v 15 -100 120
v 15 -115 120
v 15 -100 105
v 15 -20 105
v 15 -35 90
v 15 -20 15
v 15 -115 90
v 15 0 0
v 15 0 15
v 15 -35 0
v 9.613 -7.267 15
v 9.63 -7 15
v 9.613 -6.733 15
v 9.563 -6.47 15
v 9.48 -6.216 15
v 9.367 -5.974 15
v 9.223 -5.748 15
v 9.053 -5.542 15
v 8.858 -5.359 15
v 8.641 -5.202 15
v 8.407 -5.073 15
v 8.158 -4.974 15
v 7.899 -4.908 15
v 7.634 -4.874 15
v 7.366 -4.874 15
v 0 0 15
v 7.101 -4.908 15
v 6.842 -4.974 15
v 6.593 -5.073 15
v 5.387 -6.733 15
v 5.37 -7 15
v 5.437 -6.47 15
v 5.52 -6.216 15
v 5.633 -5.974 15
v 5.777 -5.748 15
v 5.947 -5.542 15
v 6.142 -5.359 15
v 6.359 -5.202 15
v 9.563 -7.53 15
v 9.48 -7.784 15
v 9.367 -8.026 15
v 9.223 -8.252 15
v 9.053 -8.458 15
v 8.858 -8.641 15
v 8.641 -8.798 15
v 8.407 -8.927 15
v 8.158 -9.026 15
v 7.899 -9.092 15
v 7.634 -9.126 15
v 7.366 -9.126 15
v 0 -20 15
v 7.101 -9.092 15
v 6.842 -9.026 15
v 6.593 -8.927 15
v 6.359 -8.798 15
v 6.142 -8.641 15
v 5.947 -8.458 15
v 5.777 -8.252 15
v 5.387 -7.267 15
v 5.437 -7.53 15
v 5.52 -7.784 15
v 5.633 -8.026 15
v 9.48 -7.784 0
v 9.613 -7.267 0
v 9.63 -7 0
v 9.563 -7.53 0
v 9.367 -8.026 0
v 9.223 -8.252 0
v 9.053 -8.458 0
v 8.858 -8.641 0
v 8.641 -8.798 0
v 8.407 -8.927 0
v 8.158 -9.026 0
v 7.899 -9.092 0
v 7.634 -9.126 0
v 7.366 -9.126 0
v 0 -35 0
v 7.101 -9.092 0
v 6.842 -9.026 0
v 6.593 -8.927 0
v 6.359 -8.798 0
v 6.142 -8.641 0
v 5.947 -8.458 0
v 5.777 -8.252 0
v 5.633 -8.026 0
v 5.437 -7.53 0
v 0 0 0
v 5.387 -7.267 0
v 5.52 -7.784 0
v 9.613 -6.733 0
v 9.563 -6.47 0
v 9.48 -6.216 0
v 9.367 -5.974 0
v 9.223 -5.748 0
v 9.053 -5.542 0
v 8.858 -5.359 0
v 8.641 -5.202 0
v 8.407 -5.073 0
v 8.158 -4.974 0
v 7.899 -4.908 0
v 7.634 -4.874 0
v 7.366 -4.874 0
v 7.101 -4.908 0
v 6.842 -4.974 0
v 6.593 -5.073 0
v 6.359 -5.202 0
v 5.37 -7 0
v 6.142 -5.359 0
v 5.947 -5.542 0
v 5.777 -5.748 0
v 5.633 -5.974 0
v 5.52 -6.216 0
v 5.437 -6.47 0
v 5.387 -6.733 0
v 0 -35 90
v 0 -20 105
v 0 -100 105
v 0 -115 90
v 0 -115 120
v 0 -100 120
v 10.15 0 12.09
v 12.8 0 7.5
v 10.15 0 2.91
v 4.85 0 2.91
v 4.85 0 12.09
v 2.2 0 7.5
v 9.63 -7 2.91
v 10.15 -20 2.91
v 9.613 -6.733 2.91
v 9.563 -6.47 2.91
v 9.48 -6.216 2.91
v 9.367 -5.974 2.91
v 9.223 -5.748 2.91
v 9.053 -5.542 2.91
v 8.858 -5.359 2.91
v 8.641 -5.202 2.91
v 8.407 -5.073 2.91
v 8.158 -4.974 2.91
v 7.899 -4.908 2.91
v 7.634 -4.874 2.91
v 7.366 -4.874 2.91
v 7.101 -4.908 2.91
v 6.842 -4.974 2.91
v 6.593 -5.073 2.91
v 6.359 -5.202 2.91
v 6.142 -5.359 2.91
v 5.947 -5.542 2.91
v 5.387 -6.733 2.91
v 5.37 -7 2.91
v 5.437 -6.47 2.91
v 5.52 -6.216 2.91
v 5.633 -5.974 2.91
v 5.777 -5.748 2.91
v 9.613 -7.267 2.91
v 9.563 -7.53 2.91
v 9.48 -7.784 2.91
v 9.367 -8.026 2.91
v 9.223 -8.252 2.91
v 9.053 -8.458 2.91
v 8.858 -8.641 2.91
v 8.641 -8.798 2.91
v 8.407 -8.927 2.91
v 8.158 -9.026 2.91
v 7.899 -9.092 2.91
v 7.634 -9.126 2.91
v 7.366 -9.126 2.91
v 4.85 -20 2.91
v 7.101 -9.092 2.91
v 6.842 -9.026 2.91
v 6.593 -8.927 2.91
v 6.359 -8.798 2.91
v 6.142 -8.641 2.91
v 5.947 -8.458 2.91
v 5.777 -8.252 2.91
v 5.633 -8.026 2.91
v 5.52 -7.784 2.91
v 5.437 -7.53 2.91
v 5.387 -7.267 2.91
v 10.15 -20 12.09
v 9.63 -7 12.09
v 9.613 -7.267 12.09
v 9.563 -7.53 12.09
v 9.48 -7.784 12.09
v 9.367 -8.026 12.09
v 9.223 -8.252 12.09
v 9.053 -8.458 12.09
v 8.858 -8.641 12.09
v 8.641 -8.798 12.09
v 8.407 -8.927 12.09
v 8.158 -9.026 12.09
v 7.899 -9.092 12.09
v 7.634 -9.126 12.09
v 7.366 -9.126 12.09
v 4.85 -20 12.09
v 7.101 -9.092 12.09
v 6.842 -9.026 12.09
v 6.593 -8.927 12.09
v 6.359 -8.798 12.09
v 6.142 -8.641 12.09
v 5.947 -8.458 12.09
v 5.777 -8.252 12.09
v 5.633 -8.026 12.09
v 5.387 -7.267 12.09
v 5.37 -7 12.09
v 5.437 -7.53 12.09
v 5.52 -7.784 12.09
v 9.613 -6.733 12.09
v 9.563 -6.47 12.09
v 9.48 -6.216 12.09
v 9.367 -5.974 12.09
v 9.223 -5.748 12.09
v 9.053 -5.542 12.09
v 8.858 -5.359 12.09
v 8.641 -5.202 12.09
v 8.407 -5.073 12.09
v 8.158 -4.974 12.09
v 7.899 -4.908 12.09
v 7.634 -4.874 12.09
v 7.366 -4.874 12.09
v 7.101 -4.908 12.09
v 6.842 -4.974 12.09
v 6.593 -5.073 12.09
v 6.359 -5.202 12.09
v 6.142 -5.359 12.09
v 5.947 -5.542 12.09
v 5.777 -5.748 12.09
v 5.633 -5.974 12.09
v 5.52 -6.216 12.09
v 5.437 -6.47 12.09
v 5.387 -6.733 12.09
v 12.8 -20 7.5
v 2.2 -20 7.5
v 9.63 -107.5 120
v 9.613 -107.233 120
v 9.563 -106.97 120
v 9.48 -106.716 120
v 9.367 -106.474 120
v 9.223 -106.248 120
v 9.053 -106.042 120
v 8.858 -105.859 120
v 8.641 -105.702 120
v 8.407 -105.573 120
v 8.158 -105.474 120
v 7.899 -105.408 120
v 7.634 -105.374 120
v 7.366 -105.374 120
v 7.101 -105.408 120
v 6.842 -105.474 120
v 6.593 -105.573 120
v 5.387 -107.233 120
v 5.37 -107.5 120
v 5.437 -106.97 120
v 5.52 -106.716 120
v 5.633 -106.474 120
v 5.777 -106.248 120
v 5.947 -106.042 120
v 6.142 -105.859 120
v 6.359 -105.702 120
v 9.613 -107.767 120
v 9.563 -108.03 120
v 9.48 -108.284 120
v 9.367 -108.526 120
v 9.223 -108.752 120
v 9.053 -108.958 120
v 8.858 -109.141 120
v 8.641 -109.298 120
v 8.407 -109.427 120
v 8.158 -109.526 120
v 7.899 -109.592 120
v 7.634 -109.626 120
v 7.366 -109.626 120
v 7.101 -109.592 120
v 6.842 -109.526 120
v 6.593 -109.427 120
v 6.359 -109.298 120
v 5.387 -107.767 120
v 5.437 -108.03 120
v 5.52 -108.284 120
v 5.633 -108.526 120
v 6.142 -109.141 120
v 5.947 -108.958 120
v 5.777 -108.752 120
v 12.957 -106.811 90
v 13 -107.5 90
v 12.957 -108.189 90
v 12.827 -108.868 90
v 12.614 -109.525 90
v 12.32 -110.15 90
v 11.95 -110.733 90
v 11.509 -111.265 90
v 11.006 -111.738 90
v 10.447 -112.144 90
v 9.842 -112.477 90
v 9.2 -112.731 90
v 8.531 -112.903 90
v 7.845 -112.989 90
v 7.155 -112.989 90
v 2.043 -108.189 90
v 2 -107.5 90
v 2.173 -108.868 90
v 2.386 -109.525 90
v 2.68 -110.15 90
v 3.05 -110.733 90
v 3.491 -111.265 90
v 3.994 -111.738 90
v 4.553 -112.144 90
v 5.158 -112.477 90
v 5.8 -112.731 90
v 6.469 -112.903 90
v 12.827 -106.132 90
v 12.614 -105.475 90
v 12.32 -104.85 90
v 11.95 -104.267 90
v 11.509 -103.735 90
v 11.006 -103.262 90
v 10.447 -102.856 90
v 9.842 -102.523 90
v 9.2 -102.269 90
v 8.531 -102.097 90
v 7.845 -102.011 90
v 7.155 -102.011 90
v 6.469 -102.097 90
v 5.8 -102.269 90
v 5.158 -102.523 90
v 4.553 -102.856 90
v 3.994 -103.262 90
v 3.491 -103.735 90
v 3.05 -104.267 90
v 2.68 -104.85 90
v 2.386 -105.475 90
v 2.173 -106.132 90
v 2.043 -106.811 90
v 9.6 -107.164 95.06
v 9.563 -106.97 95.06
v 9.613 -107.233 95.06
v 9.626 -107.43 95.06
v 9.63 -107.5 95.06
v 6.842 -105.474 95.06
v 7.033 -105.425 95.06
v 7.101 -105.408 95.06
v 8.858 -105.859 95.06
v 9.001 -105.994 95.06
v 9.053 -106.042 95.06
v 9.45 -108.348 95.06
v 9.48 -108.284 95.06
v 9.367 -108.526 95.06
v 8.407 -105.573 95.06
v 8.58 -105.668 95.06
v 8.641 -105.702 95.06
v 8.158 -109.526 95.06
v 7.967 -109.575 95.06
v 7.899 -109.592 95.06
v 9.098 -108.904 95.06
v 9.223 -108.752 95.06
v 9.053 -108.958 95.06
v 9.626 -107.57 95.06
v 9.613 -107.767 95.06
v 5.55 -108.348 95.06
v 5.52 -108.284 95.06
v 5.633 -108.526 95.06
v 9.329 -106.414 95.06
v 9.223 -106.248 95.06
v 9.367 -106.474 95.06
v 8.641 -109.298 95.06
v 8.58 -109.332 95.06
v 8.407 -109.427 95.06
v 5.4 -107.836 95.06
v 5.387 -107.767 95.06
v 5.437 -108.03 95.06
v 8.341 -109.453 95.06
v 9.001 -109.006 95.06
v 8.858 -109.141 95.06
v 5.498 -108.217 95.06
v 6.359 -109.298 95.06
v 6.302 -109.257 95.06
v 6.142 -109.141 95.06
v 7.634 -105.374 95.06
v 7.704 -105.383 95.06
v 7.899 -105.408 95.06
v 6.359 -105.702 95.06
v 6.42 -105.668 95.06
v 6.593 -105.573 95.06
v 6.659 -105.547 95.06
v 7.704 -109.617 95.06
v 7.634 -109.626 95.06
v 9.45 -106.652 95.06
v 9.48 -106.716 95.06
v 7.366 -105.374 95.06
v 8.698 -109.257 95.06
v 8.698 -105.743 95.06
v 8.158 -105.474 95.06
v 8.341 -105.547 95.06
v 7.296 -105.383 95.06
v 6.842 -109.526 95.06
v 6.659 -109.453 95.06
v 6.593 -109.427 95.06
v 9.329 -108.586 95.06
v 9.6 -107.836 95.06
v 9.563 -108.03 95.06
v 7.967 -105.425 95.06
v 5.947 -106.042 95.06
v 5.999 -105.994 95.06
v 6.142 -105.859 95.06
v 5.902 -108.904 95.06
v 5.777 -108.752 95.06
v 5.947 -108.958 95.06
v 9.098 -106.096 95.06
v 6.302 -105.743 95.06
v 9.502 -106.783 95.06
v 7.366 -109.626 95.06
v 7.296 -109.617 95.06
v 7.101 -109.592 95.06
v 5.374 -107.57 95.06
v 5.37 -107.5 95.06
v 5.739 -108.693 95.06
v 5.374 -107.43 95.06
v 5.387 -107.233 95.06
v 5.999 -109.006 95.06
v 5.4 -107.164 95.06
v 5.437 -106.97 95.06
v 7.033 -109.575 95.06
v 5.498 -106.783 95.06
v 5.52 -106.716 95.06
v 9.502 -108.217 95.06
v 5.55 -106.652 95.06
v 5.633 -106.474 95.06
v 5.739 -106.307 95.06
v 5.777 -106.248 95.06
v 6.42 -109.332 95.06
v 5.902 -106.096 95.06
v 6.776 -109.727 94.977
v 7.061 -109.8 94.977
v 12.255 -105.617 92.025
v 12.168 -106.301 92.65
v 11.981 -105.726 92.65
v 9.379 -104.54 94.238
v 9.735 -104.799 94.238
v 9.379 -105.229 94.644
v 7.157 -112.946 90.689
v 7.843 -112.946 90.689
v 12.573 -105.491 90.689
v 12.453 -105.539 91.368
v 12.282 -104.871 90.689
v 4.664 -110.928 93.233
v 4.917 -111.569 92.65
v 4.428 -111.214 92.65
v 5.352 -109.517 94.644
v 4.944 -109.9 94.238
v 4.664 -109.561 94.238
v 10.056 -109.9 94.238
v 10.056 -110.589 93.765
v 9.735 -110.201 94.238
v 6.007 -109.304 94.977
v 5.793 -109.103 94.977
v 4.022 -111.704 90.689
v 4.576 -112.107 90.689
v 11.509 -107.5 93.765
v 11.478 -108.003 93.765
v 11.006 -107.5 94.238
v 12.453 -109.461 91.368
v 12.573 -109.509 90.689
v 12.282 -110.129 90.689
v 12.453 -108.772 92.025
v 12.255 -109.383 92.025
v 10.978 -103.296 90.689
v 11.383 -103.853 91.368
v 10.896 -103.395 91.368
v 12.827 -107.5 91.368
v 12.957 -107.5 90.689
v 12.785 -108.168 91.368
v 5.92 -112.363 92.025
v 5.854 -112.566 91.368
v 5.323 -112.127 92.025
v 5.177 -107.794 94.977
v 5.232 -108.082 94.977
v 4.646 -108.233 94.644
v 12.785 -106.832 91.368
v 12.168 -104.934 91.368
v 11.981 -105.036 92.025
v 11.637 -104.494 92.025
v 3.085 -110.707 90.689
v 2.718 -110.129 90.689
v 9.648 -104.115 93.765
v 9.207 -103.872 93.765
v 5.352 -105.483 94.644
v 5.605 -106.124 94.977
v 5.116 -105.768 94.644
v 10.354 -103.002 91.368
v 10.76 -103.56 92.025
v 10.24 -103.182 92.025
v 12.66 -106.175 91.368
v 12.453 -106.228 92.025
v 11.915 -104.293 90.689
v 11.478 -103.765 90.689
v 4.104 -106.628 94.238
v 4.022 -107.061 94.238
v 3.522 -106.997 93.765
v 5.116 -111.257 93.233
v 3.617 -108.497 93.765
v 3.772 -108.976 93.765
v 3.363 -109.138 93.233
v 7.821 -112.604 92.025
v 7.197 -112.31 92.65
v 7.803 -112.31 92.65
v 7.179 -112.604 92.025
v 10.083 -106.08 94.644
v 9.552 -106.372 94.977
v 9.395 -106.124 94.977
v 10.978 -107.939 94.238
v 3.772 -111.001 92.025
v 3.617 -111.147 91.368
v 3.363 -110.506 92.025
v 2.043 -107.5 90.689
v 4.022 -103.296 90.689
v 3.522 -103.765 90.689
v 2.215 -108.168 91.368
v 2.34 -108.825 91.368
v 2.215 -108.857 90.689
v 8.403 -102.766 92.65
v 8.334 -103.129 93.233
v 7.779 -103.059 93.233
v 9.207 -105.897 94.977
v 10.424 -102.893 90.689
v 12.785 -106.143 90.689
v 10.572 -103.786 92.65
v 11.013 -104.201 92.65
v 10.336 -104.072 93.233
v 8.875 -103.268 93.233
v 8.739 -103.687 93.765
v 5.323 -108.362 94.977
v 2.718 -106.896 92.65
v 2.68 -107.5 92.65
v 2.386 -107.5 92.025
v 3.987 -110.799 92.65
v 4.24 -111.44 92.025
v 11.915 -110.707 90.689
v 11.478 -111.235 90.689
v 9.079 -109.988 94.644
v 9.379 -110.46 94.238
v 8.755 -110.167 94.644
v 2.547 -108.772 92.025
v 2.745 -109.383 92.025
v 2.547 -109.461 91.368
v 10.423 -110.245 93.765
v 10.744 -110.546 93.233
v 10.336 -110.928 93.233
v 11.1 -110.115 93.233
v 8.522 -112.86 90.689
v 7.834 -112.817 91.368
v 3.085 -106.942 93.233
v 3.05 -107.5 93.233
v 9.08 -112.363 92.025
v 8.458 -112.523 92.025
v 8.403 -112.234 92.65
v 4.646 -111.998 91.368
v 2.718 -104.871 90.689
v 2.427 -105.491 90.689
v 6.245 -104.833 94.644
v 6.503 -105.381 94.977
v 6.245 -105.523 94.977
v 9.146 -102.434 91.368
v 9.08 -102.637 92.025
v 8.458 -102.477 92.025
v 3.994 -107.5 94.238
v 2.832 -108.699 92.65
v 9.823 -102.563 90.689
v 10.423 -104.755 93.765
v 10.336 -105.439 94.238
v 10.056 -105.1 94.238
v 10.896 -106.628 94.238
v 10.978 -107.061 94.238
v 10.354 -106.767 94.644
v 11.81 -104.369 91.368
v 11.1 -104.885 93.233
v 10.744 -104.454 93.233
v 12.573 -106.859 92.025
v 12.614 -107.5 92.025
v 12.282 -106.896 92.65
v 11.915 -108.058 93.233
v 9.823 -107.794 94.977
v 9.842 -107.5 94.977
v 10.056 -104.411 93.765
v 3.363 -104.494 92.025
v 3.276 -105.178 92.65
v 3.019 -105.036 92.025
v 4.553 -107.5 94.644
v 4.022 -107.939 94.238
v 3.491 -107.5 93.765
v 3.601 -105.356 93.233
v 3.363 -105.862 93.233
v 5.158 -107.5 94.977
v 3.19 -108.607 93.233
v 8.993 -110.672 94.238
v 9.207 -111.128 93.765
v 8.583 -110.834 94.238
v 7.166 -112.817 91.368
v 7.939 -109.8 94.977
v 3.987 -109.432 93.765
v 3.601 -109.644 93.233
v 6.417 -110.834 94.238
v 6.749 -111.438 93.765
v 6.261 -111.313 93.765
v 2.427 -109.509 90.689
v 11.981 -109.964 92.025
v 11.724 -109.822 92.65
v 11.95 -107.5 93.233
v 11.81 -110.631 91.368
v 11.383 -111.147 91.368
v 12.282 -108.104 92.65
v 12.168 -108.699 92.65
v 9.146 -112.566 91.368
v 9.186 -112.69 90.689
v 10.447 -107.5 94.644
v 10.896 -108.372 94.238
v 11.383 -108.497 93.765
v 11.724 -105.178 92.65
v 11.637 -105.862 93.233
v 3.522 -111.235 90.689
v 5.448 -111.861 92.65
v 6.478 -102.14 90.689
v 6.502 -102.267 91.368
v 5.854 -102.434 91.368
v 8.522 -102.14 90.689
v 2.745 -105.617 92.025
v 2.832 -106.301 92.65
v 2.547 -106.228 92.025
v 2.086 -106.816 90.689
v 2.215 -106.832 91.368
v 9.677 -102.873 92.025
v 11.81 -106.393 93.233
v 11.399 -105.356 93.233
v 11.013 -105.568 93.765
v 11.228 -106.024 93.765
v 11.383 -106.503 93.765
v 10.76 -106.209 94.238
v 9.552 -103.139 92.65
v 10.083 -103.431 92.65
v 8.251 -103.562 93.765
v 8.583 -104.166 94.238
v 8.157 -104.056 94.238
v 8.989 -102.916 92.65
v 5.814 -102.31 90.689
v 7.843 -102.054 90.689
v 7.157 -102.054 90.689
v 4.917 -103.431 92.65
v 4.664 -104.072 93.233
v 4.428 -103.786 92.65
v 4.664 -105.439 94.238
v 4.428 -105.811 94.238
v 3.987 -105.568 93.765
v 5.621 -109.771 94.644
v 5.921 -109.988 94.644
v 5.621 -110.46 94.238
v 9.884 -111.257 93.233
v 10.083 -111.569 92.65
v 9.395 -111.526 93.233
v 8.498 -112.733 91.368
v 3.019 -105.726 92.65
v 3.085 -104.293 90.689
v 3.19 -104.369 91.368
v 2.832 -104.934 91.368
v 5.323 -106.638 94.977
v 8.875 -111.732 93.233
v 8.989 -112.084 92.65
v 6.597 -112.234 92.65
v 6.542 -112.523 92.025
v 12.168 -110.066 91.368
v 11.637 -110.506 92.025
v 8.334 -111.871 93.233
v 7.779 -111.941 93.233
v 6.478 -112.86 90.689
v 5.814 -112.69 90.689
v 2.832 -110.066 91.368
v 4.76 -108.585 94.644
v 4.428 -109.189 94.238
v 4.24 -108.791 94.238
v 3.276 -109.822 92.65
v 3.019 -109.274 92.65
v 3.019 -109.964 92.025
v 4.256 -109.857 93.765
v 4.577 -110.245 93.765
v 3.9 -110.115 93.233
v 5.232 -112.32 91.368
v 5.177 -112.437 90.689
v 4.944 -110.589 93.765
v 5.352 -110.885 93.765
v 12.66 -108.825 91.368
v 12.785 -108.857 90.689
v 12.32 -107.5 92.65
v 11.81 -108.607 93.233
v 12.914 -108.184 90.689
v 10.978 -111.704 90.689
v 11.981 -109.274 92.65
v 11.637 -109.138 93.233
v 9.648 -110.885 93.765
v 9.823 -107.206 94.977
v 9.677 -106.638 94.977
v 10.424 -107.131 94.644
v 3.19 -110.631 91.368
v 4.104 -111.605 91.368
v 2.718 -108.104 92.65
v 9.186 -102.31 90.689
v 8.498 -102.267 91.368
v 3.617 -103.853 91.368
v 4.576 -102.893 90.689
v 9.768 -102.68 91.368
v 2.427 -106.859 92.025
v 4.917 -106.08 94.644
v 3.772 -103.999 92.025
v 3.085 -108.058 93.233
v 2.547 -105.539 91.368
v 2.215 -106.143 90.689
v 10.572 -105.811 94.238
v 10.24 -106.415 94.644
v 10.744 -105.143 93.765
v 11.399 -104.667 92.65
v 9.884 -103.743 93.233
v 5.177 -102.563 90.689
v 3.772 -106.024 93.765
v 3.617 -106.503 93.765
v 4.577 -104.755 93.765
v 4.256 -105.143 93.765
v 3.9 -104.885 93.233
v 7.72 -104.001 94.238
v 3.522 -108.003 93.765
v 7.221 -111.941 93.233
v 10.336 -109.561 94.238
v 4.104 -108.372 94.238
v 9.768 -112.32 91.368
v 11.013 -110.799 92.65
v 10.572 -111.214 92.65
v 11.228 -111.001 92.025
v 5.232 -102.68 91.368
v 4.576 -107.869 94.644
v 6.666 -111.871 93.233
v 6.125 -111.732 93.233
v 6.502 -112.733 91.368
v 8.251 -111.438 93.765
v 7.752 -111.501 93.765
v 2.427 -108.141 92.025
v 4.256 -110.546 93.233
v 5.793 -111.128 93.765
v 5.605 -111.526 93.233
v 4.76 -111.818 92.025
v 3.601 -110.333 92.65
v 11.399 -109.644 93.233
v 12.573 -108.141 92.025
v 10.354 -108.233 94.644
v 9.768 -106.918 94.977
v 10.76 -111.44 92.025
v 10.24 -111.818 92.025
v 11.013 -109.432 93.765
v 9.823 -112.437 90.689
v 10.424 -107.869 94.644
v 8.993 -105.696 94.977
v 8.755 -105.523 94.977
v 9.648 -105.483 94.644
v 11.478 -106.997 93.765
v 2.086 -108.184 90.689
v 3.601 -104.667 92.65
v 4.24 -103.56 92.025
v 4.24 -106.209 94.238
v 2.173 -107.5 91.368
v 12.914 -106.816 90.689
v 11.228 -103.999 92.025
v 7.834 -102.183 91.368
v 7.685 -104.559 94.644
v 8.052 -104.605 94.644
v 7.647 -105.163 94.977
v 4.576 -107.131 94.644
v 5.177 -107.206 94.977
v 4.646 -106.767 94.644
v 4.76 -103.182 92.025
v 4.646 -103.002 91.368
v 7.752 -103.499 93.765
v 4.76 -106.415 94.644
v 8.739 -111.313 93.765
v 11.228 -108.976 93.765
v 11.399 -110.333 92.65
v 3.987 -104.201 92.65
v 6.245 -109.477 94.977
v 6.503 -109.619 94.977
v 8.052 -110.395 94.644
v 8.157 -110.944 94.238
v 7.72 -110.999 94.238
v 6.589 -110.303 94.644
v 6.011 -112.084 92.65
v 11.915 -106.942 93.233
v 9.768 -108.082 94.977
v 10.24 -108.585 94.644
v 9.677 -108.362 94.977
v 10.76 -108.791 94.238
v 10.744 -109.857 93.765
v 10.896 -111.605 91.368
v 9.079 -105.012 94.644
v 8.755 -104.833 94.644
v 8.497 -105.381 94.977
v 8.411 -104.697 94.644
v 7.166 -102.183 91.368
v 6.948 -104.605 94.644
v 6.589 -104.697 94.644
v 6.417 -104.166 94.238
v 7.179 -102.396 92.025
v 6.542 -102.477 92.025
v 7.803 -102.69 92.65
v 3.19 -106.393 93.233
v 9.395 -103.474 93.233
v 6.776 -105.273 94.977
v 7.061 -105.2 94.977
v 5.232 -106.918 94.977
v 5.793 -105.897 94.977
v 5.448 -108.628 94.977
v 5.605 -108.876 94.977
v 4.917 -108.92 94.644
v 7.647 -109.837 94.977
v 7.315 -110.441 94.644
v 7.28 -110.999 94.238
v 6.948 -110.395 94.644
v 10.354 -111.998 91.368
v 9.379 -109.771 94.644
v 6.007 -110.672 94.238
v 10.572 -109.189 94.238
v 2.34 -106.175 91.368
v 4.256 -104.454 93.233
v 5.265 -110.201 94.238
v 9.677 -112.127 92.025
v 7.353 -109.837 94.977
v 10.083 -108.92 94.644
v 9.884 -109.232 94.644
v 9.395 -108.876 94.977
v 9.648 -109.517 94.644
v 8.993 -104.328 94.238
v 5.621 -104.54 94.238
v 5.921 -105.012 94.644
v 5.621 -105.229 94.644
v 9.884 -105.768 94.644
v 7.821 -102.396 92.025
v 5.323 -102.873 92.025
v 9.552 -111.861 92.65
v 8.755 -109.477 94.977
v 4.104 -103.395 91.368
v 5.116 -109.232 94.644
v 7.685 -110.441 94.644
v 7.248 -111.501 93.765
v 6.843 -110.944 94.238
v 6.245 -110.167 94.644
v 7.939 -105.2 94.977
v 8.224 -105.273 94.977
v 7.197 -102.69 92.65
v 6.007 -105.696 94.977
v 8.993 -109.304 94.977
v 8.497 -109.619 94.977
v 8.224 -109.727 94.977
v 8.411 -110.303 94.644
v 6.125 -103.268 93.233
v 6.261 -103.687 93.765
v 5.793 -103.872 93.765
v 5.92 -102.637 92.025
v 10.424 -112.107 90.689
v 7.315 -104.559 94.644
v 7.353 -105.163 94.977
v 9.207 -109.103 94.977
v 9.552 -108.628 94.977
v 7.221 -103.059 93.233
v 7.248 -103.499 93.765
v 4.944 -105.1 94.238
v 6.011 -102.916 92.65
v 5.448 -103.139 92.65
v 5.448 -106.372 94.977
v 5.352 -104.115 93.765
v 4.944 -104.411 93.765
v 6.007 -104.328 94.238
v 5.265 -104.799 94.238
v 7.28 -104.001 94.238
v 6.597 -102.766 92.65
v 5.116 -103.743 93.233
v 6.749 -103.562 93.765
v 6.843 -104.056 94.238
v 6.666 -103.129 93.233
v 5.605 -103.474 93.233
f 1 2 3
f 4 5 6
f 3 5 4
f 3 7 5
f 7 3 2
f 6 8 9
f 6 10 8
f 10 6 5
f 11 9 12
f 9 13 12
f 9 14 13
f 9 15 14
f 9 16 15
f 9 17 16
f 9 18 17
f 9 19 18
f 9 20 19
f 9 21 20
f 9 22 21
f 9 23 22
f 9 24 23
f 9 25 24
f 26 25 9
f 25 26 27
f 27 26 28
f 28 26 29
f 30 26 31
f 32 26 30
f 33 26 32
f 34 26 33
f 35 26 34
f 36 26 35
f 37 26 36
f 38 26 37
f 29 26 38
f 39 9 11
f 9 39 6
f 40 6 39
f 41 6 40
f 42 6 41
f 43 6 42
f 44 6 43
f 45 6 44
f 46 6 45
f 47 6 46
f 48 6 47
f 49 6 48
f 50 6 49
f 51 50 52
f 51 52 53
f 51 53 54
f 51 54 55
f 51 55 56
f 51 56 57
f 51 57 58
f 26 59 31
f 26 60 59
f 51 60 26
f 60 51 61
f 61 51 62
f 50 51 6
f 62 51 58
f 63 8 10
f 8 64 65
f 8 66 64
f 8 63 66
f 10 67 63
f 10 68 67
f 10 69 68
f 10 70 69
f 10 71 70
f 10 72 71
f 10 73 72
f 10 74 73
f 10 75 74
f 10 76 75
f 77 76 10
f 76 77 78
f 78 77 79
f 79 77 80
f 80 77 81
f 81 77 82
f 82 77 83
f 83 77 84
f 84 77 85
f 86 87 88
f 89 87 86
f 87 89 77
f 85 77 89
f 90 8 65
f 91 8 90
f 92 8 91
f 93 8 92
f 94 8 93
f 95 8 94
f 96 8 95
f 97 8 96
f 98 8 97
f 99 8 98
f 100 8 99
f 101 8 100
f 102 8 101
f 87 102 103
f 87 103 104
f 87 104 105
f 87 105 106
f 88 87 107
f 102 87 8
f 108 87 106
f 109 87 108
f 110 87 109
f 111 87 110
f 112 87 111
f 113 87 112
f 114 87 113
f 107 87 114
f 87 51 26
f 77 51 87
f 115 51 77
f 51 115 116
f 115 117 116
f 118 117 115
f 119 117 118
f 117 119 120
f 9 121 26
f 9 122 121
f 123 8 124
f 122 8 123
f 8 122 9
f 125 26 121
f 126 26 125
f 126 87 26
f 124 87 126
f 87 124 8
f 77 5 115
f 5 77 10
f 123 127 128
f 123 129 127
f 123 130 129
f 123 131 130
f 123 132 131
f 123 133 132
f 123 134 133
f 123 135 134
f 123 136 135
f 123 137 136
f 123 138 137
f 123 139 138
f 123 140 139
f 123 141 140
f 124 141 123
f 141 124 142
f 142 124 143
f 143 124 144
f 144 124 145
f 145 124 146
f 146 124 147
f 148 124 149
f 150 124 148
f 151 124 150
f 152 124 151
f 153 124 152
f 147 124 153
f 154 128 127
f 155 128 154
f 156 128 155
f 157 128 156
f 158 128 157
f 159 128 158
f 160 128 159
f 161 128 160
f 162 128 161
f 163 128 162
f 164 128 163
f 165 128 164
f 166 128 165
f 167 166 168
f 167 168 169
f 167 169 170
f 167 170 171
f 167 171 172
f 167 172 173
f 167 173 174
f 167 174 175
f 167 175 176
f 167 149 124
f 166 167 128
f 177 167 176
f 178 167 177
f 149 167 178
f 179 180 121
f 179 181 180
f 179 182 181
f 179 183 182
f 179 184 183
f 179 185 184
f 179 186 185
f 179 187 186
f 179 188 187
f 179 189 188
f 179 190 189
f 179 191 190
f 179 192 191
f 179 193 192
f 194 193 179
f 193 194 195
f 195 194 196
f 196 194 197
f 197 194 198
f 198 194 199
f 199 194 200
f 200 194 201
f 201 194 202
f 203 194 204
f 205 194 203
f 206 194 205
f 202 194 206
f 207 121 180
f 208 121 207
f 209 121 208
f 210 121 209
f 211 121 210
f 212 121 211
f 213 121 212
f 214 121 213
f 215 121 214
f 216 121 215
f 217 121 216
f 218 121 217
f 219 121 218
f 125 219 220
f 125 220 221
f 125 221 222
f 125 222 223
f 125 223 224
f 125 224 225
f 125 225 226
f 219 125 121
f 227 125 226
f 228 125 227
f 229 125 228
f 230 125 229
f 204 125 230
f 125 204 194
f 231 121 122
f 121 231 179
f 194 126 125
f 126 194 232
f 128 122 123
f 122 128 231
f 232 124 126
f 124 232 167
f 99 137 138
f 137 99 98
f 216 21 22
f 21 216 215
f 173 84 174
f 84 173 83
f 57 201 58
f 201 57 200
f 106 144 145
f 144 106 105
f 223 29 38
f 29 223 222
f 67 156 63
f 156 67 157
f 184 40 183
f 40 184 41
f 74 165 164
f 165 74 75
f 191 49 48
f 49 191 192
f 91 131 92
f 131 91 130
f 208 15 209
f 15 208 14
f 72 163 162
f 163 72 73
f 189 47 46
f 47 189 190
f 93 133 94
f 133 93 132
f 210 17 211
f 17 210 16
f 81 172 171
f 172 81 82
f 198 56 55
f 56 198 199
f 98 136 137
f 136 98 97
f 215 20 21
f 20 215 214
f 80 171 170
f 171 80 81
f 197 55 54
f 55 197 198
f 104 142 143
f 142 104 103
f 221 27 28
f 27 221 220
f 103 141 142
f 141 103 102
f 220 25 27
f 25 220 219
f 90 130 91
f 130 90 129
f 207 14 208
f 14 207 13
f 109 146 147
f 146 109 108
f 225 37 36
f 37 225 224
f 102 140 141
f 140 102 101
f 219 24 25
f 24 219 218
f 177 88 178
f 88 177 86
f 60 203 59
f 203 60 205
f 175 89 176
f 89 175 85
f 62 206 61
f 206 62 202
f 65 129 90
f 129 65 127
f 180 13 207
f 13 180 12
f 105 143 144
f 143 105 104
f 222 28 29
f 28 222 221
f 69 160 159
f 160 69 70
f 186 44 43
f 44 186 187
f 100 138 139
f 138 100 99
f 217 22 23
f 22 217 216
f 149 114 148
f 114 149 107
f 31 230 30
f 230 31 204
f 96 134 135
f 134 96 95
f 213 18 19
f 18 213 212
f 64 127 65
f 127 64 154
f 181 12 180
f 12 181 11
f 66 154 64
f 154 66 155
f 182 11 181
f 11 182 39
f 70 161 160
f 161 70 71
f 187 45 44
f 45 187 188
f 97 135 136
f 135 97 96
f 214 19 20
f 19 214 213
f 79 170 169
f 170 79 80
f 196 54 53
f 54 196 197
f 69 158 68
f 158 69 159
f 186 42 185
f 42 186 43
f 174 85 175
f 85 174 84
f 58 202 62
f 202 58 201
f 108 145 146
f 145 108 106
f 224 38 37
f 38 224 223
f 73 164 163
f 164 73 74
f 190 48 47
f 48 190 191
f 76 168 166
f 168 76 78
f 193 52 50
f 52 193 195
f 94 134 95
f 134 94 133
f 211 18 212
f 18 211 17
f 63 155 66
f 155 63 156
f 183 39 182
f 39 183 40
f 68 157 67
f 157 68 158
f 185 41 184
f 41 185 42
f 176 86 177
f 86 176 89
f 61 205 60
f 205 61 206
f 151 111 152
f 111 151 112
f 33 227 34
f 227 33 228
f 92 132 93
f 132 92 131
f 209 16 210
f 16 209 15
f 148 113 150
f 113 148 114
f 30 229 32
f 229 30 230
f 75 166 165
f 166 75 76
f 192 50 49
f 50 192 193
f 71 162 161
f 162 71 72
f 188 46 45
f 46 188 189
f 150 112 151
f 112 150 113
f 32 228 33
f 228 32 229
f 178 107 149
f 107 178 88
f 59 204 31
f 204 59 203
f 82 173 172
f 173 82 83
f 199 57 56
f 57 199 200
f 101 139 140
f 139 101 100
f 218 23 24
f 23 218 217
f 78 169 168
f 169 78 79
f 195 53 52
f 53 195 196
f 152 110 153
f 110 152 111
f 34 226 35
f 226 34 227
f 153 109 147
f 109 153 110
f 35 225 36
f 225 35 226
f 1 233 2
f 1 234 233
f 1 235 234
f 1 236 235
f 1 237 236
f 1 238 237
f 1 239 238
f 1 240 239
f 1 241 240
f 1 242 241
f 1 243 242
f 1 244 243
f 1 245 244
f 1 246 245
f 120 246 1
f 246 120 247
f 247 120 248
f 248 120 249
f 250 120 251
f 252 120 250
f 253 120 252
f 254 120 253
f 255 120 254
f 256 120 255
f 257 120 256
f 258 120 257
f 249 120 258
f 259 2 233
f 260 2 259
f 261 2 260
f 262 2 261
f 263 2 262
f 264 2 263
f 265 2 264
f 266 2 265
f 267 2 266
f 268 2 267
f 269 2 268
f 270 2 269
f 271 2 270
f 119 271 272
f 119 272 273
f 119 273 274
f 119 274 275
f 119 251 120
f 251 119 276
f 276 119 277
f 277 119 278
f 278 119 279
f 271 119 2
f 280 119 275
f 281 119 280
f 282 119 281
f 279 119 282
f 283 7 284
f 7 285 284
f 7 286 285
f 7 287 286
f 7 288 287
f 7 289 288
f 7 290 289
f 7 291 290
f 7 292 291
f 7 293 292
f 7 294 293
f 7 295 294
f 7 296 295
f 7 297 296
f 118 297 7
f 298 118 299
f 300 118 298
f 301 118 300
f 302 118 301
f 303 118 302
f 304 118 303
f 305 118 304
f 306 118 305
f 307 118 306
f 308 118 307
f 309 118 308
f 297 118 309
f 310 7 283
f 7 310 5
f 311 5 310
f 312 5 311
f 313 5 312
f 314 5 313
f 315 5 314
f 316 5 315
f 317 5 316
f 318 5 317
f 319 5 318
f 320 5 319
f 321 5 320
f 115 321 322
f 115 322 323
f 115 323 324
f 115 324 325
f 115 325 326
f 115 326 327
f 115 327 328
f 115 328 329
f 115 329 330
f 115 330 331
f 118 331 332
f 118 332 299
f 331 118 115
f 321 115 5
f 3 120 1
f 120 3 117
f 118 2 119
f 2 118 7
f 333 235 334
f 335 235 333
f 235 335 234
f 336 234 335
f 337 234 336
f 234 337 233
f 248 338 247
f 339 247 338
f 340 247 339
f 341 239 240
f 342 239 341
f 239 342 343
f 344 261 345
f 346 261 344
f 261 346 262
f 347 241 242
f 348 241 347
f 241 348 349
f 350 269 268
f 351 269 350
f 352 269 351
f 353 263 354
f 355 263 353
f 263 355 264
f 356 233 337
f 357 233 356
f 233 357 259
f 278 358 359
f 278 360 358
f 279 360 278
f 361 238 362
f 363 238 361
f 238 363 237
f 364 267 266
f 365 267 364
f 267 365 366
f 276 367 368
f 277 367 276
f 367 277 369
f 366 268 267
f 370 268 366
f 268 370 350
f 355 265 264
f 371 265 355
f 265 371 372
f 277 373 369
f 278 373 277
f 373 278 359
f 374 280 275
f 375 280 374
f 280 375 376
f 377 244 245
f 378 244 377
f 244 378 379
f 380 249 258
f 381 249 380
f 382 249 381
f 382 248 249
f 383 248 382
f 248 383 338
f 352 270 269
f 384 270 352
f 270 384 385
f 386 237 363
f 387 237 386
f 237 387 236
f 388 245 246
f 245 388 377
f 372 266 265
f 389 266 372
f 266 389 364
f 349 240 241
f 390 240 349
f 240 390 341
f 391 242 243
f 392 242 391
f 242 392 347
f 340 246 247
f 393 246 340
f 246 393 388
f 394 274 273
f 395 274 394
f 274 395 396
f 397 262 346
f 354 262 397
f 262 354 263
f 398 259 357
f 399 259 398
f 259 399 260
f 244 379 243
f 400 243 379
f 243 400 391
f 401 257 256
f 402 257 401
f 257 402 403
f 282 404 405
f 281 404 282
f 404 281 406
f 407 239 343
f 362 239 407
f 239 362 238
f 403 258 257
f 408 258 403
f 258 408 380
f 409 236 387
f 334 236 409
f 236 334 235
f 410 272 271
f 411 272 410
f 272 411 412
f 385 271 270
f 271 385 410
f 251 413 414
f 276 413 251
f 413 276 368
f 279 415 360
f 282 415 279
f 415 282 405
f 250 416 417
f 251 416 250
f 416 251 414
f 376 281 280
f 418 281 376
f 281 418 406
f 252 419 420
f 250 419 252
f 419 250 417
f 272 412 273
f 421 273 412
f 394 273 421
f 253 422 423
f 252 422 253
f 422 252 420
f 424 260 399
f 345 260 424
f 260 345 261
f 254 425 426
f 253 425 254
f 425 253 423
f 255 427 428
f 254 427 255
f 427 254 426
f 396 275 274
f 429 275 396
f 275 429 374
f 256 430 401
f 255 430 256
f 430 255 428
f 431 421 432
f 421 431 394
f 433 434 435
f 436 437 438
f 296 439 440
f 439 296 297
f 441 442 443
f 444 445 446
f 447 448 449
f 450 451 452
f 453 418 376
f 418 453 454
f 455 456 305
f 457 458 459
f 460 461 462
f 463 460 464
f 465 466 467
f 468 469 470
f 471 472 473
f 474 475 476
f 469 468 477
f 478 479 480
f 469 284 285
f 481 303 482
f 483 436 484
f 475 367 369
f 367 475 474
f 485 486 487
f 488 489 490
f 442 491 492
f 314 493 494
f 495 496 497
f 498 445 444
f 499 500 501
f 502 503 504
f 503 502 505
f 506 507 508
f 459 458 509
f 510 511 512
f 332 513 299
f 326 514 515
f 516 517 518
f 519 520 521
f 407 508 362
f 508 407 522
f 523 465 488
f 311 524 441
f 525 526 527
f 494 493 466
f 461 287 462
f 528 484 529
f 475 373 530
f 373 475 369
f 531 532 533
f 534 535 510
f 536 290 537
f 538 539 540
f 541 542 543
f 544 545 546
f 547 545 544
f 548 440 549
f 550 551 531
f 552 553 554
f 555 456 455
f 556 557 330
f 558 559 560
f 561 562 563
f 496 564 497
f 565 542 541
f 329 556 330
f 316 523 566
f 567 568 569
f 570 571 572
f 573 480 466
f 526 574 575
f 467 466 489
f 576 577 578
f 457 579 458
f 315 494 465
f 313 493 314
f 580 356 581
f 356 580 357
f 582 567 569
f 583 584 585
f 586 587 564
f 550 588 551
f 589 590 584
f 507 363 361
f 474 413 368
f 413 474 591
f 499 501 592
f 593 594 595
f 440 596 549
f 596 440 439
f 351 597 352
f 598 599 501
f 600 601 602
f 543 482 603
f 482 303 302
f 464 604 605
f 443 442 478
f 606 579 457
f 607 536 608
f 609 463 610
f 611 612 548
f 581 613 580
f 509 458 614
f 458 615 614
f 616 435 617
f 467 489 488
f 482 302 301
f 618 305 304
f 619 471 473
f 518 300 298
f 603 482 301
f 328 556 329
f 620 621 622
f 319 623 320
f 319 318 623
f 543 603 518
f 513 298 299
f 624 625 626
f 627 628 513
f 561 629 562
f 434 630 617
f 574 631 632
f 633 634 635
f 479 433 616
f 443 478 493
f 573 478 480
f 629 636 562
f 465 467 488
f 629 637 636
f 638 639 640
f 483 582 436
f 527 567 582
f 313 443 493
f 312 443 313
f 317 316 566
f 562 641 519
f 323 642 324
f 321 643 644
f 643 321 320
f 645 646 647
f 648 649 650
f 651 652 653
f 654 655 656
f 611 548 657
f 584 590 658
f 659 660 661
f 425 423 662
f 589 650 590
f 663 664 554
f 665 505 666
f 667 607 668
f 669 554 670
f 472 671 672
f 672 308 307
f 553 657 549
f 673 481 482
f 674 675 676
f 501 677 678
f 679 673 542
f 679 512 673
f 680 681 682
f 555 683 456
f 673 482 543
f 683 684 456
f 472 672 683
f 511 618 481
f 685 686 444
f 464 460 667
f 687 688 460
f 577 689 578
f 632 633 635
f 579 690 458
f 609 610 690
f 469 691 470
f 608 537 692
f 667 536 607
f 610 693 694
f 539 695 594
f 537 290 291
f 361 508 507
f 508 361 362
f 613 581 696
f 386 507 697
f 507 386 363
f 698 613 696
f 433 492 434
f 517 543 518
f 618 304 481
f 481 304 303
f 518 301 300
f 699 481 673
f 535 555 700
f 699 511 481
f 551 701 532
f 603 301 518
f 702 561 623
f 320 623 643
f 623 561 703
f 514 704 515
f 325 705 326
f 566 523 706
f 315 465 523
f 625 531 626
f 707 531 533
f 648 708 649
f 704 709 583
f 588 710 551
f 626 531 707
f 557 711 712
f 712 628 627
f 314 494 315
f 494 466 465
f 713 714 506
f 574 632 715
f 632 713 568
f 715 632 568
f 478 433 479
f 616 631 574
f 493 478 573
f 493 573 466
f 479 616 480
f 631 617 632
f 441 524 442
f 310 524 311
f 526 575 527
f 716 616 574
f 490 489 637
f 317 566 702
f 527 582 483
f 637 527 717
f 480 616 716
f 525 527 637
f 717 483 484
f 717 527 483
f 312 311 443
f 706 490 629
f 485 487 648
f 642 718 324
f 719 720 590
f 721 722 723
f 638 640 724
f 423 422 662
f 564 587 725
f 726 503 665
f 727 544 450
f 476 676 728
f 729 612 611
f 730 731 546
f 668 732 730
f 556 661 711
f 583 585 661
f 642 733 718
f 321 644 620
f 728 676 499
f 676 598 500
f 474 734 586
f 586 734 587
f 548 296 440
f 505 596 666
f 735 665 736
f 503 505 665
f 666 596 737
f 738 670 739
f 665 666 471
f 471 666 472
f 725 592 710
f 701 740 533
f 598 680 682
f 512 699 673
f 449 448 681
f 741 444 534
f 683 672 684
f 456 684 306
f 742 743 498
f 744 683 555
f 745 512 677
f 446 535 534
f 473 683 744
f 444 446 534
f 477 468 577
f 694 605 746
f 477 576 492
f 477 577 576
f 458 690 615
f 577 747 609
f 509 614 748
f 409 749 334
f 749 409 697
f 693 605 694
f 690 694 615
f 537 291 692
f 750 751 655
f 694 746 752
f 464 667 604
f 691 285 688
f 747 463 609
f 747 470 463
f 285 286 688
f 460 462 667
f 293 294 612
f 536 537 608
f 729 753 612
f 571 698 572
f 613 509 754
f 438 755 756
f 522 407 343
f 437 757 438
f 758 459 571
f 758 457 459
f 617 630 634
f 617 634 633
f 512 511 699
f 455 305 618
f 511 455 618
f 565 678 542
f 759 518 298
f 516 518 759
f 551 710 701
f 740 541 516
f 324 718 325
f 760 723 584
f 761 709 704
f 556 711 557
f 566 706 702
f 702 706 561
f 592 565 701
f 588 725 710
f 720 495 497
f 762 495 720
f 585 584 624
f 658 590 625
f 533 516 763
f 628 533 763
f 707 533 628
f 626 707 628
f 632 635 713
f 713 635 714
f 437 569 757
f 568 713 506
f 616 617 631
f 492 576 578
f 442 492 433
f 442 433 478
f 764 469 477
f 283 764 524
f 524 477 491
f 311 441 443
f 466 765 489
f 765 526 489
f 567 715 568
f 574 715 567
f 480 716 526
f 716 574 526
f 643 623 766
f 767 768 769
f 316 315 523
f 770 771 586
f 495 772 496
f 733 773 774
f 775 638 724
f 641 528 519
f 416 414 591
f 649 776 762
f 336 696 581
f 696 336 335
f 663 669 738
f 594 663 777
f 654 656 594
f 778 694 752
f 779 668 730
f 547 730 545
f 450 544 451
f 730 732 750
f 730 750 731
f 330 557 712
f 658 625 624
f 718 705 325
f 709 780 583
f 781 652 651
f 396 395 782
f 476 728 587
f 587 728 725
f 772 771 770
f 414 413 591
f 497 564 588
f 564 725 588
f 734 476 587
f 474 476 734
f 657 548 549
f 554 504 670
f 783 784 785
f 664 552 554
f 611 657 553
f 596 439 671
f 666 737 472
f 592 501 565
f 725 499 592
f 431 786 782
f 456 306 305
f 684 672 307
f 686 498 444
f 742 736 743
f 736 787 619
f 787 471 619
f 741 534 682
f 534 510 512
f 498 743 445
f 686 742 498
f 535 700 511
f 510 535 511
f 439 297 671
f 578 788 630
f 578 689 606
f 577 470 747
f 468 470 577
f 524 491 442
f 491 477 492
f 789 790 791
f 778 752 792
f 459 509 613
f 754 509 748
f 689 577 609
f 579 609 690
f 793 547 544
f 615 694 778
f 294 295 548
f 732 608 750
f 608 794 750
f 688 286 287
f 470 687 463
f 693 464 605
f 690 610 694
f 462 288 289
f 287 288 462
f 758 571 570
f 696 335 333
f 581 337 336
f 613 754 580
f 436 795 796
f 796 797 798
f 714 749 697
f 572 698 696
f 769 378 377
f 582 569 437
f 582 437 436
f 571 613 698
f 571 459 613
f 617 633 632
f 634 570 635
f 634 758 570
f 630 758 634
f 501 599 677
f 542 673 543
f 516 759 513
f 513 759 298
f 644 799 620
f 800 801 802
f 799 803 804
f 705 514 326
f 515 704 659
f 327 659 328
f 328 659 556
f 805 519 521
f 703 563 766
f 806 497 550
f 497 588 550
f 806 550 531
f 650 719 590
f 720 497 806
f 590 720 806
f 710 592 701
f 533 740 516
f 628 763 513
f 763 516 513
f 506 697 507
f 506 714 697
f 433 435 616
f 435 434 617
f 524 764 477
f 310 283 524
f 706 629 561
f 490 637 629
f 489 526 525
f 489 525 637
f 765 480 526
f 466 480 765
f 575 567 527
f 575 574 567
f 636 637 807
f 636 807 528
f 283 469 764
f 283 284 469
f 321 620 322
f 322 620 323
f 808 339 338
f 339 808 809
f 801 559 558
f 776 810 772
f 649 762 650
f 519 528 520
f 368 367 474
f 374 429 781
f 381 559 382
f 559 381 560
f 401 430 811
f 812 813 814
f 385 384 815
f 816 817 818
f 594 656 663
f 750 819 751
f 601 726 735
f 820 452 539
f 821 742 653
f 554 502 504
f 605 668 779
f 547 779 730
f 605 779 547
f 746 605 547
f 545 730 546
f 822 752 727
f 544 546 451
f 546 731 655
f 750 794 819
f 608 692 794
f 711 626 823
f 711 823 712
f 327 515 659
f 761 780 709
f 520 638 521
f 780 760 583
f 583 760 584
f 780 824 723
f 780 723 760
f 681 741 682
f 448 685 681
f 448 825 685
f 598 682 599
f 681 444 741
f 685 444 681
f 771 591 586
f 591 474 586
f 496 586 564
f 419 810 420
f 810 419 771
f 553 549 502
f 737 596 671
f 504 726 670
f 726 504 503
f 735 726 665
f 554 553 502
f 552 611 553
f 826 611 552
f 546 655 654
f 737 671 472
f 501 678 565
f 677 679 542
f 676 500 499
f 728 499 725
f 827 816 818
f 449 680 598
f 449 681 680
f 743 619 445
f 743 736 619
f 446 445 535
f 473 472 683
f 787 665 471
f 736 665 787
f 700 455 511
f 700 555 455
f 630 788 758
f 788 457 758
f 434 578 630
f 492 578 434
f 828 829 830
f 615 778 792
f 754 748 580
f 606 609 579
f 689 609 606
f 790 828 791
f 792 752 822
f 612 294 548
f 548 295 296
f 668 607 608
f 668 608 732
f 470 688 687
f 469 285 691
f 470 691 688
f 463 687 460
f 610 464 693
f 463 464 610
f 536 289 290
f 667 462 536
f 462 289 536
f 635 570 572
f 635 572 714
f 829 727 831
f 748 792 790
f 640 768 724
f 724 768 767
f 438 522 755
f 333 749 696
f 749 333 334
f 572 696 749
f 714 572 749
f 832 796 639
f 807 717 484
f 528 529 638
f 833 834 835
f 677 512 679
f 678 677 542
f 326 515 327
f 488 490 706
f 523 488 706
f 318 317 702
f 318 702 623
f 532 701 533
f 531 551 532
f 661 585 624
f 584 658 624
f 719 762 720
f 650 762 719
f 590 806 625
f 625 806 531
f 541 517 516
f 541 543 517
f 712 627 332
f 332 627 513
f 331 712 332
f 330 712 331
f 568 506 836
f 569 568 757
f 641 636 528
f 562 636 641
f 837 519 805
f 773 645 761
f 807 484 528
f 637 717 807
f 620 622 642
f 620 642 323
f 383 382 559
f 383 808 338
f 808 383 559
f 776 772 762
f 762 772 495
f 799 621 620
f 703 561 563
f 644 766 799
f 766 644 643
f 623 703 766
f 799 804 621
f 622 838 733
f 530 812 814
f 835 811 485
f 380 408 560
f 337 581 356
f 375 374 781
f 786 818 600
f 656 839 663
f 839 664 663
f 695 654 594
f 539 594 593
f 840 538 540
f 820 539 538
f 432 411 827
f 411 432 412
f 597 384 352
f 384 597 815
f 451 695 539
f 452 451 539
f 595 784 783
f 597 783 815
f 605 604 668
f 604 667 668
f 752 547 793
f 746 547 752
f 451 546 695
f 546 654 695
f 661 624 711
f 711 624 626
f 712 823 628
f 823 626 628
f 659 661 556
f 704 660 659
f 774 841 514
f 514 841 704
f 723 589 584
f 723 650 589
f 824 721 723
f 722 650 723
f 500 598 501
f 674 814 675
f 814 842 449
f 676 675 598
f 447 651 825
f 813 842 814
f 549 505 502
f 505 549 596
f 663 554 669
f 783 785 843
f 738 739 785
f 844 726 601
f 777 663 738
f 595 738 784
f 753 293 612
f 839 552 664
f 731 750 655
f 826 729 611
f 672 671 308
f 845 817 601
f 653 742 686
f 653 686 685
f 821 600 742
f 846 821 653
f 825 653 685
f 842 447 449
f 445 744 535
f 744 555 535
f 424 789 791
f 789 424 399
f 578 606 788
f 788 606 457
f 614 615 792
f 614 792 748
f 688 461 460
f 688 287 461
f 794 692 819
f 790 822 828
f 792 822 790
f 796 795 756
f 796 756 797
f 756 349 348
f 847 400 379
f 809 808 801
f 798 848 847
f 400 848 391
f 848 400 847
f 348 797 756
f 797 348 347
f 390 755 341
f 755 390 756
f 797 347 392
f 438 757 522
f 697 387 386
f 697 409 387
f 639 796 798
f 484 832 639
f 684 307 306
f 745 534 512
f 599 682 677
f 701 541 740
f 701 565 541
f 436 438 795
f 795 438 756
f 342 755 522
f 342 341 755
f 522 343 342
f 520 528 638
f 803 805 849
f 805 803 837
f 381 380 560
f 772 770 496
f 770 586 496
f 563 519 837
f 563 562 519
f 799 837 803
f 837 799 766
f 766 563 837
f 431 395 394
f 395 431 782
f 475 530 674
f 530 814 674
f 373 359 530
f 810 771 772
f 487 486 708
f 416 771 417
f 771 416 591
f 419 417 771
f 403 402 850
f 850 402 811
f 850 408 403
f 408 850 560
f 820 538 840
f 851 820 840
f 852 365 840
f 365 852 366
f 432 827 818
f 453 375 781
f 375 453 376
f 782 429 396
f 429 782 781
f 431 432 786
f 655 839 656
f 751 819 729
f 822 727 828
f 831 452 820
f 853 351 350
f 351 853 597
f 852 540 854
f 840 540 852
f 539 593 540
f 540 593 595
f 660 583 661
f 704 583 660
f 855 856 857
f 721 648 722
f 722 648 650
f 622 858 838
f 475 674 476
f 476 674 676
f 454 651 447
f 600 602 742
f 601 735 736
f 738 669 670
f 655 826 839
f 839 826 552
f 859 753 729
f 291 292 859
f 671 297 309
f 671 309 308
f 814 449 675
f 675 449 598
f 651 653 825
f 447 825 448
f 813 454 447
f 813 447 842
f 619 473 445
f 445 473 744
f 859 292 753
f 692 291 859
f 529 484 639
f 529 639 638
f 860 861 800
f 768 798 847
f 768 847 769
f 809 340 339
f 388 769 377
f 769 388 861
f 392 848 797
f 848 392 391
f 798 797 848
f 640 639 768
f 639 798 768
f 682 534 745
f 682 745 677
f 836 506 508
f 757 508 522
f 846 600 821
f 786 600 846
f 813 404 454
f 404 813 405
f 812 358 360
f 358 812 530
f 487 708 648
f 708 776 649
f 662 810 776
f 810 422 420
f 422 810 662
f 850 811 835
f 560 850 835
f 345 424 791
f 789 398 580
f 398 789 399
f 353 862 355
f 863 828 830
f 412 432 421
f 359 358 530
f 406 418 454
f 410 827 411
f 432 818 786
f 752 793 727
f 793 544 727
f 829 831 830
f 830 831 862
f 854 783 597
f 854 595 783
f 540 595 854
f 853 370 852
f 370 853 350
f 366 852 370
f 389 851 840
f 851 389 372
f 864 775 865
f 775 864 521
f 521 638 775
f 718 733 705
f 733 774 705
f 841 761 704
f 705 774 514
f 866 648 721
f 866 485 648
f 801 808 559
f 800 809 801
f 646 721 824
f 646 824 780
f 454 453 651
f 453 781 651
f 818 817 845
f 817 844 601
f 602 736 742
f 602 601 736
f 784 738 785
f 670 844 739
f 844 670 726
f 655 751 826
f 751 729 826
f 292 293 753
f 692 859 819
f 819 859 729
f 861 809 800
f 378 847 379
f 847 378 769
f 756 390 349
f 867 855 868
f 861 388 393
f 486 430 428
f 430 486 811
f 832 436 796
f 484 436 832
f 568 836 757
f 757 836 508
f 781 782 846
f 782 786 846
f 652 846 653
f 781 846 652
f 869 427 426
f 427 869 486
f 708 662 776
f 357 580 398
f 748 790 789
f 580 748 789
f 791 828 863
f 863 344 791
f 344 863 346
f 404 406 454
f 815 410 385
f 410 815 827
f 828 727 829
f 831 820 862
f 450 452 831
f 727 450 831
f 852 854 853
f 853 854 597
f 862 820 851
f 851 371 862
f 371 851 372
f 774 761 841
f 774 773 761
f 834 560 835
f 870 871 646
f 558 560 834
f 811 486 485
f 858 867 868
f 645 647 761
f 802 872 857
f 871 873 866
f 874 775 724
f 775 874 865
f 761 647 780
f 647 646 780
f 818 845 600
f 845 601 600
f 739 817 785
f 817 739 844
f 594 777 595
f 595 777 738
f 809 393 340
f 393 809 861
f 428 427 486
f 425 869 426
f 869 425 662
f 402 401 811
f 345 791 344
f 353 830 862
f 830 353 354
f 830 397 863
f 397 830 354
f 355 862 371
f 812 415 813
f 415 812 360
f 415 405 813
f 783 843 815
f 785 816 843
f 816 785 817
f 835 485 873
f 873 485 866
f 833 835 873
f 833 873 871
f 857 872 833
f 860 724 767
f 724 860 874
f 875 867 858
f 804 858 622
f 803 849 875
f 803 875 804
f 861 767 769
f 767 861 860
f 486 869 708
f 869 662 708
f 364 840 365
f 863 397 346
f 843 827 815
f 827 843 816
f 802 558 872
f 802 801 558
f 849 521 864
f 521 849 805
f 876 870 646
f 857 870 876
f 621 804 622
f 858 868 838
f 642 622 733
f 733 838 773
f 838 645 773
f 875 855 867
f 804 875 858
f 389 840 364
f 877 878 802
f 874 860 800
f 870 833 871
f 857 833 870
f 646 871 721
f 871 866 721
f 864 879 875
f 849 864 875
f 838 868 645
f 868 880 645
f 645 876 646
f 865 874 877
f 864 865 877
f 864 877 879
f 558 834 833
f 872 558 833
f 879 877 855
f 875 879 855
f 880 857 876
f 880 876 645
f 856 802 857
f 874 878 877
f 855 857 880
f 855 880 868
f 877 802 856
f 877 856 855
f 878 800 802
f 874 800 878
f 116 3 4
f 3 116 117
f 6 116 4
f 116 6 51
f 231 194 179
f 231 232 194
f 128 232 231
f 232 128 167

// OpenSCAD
// file: HS_moth_tether_0_variables.scad
// v2
$fn = 50;

//Old design
wd=15;
L1=20+wd;
L2=75+(2*wd);
L3=65+wd;
L4=30;

//From motor
len_shaft=16; 
r_shaft=3.23;
r_bolt=2.13; //M4 : 4.3mm

//New ball-socket sizes (2mm saperation from edge)
r_ball_socket=5.5;
r_ball=4.85;

r_tether=3.2;
r_tether_hole=2.5;
r_tether_bolt=1.65; //M3 : 3.3mm
r_tether_bolt_case=3.5;
h_tether=63;
h_tether_bolt=15;
h_tether_bolt_case=h_tether_bolt;
// main file
include <HS_moth_tether_0_variables.scad>

//----------------------------//
//L1:with shaft and bolt-socket
difference(){
 translate([0,-L1,0]){
 cube([wd,L1,wd]);}
////Shaft_hex
 translate([(wd/2),-11.5,(wd/2)]){rotate(a=90,v=[1,0,0]){
   Polygon(N=6,R=5.3,h=23.1);}}
////Bolt at shaft
 translate([(wd/2),-7,-1]){
 cylinder(r=r_bolt,h=wd+2);} //5 , 10
}


// Right-angle structure
translate([0,-L1,0]){
cube([wd,wd,L2]);}

translate([0,-(L1+L3-wd),(L2-wd)]){
cube([wd,L3,wd]);}

//Box with Ball-socket joint
difference(){
 translate([0,-(L1+L3),(L2-wd)]){
 cube([wd,wd,L4]);}
////Bolt
 translate([(wd/2),-(L1+L3-(wd/2)),(L2-wd)]){
 cylinder(r=r_bolt,h=L4+1);} // 1
////Ball_socket
 translate([(wd/2),-(L1+L3-(wd/2)),(L2-wd)]){
 sphere(r=r_ball_socket);}
}

//----------//
//-----------------------------//
// Polygon : 
module Polygon(N=3,A=0,R=0,S=0,h=0,debug=false)
{
	N = ( N < 3 ? 3 : N );
	angle = 360/N;
	angleA = angle/2;
	if ( A > 0 )		// if A assign R and S
	{
        S = 2 * A * tan(angleA); // assign
		//R = (S/2) / sin(angleA); // no assign ???
		R = ( A * tan(angleA) ) / sin(angleA);	// asign
		_Build_Polygon(N=N,R=R,h=h);
	}
	else
	{
		if ( S > 0 )		// if S assign R and A
		{
			R = (S/2) / sin(angleA); // assign
			A = S / ( 2 * tan(angleA) ); // assign
            _Build_Polygon(N=N,R=R,h=h);
		}
		else
		{
			if ( R == 0 )		// default
			{
				S = 2 * R * sin(angleA); // no assign ???
				A = S / ( 2 * tan(angleA) ); // no assign ???
				_Build_Polygon(N=N,h=h);
			}
			else		// build with R
			{
				S = 2 * R * sin(angleA);
				A = S / ( 2 * tan(angleA) );	// no assign ???
				//A = R * ( sin(angleA) / tan(angleA) )	// no assign ???
				_Build_Polygon(N=N,R=R,h=h);
			}
		}
	}
}

// Build
module _Build_Polygon(N=3,R=1,h=0)
{
	if (h > 0)
	{
		// 3D primitive h>0
		cylinder(r=R,h=h,$fn=N,center=true);
	}
	else
	{
		// 2D primitive h=0
		circle(r=R,$fn=N,center=true);
	}
}
/*
	Definition

	N = Number of Side N >=3
	A = apothem
		radius of inside circle
	R = circumradius
		Radius of outside circle
	S = Side
		Lenght of a side

	Build polygon with the Apothem :
	N and A is known
	Need to calculate S then R
	use $fn

	Build Polygon with Circumradius
	N and R known
	use $fn

	Build Polygon with Side
	N and S Known
	Need to calculate R and optionaly A
	use $fn	

	TO DO
    Control result

	For more information :
	http://en.wikipedia.org/wiki/Regular_polygon

*/
